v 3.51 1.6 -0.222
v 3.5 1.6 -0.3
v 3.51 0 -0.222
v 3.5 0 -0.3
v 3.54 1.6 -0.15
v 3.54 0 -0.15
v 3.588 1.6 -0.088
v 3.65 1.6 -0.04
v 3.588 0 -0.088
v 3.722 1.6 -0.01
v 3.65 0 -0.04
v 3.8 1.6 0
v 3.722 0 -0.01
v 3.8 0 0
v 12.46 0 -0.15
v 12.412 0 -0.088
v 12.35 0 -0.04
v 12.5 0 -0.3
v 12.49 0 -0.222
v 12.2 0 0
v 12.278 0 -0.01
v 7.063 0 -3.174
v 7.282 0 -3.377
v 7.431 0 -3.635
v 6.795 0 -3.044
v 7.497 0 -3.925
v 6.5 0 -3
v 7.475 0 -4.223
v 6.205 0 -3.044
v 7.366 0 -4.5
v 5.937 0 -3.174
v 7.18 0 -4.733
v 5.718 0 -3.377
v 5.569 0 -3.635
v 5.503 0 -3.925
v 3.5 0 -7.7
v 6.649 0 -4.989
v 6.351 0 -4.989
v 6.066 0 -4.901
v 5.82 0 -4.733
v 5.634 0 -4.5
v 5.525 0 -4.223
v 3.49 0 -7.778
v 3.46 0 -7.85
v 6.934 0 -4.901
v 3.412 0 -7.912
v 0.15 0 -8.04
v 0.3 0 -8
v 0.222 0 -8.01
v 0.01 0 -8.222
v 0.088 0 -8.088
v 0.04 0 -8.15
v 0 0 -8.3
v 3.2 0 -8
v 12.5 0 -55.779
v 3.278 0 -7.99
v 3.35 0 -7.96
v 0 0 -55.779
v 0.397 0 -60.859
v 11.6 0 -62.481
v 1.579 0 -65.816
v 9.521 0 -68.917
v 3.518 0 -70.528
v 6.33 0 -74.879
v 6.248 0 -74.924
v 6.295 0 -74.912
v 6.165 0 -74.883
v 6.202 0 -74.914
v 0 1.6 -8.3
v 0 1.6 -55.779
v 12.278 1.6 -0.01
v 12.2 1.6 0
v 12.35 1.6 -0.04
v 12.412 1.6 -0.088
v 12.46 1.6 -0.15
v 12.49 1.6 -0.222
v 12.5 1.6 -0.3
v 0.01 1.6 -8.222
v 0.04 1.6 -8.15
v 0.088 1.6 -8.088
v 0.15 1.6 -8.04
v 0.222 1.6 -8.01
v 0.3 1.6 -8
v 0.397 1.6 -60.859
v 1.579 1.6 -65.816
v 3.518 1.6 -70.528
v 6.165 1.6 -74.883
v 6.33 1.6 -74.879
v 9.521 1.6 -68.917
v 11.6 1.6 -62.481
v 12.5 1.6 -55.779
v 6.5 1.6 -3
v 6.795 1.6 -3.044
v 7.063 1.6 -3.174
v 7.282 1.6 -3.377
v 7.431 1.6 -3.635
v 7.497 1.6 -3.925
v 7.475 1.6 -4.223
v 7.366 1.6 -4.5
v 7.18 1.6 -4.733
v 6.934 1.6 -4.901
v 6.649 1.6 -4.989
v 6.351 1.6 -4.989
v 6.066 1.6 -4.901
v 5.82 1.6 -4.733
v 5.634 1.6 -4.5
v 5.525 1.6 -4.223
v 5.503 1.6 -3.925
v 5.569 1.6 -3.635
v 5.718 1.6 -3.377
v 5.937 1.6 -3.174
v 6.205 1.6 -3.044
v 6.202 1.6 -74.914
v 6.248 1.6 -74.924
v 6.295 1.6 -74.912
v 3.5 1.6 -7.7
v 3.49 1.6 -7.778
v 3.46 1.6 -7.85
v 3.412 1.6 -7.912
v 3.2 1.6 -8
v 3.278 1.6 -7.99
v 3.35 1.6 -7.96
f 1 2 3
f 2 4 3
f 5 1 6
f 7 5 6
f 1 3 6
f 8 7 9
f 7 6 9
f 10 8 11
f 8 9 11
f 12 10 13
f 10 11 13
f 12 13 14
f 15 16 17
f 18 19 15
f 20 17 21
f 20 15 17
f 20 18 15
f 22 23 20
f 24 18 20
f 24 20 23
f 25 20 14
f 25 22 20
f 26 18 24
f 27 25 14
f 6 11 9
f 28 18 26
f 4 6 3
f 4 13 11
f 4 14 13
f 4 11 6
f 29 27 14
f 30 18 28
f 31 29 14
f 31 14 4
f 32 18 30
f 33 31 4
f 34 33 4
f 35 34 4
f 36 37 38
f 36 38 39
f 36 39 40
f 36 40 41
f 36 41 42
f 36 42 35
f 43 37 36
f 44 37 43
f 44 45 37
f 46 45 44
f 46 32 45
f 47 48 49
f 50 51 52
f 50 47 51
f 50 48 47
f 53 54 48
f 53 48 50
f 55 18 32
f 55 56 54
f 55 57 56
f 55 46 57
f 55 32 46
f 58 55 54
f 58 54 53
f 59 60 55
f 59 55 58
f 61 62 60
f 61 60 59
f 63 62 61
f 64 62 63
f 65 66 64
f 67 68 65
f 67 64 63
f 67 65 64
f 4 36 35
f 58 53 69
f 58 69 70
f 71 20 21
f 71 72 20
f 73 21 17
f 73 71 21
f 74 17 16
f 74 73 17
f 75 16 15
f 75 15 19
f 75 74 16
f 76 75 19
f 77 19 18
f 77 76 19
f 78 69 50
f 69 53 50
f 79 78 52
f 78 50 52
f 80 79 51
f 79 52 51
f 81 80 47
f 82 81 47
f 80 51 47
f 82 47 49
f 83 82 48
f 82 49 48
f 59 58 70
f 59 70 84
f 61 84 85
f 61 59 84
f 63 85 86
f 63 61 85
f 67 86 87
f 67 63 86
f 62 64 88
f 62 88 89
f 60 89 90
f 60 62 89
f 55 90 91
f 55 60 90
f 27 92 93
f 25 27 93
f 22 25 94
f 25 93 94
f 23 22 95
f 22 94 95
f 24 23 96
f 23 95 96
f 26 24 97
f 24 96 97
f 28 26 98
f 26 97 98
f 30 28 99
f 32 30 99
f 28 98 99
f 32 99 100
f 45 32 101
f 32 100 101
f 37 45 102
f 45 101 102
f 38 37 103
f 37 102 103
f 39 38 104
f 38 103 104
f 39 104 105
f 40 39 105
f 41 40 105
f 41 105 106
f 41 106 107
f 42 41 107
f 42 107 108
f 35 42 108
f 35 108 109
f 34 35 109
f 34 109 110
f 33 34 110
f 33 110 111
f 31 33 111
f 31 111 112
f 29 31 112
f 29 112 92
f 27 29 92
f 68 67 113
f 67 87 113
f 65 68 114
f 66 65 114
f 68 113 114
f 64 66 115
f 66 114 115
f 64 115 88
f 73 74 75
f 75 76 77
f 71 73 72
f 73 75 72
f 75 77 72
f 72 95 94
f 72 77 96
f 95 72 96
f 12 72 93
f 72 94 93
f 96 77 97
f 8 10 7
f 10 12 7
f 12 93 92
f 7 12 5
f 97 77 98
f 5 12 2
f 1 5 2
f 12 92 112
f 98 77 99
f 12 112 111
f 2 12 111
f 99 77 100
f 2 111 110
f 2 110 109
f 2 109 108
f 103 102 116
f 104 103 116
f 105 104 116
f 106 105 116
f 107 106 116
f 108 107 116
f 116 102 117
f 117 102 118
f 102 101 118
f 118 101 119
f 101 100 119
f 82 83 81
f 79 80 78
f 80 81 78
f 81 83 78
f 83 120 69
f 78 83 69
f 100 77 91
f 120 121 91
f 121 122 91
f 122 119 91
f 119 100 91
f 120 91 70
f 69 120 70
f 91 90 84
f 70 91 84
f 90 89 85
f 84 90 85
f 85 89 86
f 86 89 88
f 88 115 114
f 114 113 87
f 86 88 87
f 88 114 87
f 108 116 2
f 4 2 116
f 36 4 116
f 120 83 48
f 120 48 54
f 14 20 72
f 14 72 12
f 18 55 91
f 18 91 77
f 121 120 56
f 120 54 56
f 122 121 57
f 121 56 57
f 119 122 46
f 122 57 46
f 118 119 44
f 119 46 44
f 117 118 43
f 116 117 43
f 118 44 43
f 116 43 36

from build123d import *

# Parameters (mm, degrees)
BOSS_EXTRUDE1_DEPTH = 1.6
FILLET1_R           = 0.1
SKETCH2_R           = 1
SKETCH2_W           = 3.5
SKETCH2_H           = 8
CUT_EXTRUDE1_DEPTH  = 76.976566532
FILLET2_R           = 0.3


with BuildPart() as part:
    # Sketch1 → Boss-Extrude1 (new body)
    with BuildSketch(Plane(origin=(0, 0, 0), x_dir=(1, 0, 0), z_dir=(0, 1, 0))):
        with BuildLine():
            Line((0, 0), (0, 55.77852758))
            ThreePointArc((0, 55.77852758), (1.60175081, 65.88455922), (6.25, 75))
            ThreePointArc((6.25, 75), (10.68267286, 65.814463025), (12.5, 55.77852758))
            Line((12.5, 55.77852758), (12.5, 0))
            Line((12.5, 0), (0, 0))
        make_face()
    extrude(amount=BOSS_EXTRUDE1_DEPTH)

    # Fillet1
    fillet1_edges = [part.edges().sort_by_distance(p)[0] for p in [
        (6.25, 0.8, -75),
    ]]
    fillet(fillet1_edges, radius=FILLET1_R)

    # Sketch2 → Cut-Extrude1 (cut, through all)
    with BuildSketch(Plane(origin=(0, 1.6, 0), x_dir=(1, 0, 0), z_dir=(0, 1, 0))):
        with Locations(Location((6.5, 4, 0), (0, 0, 270))):
            Circle(SKETCH2_R)
        with Locations((1.75, 4)):
            Rectangle(SKETCH2_W, SKETCH2_H)
    extrude(amount=-CUT_EXTRUDE1_DEPTH, mode=Mode.SUBTRACT)

    # Fillet2
    fillet2_edges = [part.edges().sort_by_distance(p)[0] for p in [
        (0, 0.8, -8),
        (3.5, 0.8, -8),
        (3.5, 0.8, 0),
        (12.5, 0.8, 0),
    ]]
    fillet(fillet2_edges, radius=FILLET2_R)


solid = part.part
